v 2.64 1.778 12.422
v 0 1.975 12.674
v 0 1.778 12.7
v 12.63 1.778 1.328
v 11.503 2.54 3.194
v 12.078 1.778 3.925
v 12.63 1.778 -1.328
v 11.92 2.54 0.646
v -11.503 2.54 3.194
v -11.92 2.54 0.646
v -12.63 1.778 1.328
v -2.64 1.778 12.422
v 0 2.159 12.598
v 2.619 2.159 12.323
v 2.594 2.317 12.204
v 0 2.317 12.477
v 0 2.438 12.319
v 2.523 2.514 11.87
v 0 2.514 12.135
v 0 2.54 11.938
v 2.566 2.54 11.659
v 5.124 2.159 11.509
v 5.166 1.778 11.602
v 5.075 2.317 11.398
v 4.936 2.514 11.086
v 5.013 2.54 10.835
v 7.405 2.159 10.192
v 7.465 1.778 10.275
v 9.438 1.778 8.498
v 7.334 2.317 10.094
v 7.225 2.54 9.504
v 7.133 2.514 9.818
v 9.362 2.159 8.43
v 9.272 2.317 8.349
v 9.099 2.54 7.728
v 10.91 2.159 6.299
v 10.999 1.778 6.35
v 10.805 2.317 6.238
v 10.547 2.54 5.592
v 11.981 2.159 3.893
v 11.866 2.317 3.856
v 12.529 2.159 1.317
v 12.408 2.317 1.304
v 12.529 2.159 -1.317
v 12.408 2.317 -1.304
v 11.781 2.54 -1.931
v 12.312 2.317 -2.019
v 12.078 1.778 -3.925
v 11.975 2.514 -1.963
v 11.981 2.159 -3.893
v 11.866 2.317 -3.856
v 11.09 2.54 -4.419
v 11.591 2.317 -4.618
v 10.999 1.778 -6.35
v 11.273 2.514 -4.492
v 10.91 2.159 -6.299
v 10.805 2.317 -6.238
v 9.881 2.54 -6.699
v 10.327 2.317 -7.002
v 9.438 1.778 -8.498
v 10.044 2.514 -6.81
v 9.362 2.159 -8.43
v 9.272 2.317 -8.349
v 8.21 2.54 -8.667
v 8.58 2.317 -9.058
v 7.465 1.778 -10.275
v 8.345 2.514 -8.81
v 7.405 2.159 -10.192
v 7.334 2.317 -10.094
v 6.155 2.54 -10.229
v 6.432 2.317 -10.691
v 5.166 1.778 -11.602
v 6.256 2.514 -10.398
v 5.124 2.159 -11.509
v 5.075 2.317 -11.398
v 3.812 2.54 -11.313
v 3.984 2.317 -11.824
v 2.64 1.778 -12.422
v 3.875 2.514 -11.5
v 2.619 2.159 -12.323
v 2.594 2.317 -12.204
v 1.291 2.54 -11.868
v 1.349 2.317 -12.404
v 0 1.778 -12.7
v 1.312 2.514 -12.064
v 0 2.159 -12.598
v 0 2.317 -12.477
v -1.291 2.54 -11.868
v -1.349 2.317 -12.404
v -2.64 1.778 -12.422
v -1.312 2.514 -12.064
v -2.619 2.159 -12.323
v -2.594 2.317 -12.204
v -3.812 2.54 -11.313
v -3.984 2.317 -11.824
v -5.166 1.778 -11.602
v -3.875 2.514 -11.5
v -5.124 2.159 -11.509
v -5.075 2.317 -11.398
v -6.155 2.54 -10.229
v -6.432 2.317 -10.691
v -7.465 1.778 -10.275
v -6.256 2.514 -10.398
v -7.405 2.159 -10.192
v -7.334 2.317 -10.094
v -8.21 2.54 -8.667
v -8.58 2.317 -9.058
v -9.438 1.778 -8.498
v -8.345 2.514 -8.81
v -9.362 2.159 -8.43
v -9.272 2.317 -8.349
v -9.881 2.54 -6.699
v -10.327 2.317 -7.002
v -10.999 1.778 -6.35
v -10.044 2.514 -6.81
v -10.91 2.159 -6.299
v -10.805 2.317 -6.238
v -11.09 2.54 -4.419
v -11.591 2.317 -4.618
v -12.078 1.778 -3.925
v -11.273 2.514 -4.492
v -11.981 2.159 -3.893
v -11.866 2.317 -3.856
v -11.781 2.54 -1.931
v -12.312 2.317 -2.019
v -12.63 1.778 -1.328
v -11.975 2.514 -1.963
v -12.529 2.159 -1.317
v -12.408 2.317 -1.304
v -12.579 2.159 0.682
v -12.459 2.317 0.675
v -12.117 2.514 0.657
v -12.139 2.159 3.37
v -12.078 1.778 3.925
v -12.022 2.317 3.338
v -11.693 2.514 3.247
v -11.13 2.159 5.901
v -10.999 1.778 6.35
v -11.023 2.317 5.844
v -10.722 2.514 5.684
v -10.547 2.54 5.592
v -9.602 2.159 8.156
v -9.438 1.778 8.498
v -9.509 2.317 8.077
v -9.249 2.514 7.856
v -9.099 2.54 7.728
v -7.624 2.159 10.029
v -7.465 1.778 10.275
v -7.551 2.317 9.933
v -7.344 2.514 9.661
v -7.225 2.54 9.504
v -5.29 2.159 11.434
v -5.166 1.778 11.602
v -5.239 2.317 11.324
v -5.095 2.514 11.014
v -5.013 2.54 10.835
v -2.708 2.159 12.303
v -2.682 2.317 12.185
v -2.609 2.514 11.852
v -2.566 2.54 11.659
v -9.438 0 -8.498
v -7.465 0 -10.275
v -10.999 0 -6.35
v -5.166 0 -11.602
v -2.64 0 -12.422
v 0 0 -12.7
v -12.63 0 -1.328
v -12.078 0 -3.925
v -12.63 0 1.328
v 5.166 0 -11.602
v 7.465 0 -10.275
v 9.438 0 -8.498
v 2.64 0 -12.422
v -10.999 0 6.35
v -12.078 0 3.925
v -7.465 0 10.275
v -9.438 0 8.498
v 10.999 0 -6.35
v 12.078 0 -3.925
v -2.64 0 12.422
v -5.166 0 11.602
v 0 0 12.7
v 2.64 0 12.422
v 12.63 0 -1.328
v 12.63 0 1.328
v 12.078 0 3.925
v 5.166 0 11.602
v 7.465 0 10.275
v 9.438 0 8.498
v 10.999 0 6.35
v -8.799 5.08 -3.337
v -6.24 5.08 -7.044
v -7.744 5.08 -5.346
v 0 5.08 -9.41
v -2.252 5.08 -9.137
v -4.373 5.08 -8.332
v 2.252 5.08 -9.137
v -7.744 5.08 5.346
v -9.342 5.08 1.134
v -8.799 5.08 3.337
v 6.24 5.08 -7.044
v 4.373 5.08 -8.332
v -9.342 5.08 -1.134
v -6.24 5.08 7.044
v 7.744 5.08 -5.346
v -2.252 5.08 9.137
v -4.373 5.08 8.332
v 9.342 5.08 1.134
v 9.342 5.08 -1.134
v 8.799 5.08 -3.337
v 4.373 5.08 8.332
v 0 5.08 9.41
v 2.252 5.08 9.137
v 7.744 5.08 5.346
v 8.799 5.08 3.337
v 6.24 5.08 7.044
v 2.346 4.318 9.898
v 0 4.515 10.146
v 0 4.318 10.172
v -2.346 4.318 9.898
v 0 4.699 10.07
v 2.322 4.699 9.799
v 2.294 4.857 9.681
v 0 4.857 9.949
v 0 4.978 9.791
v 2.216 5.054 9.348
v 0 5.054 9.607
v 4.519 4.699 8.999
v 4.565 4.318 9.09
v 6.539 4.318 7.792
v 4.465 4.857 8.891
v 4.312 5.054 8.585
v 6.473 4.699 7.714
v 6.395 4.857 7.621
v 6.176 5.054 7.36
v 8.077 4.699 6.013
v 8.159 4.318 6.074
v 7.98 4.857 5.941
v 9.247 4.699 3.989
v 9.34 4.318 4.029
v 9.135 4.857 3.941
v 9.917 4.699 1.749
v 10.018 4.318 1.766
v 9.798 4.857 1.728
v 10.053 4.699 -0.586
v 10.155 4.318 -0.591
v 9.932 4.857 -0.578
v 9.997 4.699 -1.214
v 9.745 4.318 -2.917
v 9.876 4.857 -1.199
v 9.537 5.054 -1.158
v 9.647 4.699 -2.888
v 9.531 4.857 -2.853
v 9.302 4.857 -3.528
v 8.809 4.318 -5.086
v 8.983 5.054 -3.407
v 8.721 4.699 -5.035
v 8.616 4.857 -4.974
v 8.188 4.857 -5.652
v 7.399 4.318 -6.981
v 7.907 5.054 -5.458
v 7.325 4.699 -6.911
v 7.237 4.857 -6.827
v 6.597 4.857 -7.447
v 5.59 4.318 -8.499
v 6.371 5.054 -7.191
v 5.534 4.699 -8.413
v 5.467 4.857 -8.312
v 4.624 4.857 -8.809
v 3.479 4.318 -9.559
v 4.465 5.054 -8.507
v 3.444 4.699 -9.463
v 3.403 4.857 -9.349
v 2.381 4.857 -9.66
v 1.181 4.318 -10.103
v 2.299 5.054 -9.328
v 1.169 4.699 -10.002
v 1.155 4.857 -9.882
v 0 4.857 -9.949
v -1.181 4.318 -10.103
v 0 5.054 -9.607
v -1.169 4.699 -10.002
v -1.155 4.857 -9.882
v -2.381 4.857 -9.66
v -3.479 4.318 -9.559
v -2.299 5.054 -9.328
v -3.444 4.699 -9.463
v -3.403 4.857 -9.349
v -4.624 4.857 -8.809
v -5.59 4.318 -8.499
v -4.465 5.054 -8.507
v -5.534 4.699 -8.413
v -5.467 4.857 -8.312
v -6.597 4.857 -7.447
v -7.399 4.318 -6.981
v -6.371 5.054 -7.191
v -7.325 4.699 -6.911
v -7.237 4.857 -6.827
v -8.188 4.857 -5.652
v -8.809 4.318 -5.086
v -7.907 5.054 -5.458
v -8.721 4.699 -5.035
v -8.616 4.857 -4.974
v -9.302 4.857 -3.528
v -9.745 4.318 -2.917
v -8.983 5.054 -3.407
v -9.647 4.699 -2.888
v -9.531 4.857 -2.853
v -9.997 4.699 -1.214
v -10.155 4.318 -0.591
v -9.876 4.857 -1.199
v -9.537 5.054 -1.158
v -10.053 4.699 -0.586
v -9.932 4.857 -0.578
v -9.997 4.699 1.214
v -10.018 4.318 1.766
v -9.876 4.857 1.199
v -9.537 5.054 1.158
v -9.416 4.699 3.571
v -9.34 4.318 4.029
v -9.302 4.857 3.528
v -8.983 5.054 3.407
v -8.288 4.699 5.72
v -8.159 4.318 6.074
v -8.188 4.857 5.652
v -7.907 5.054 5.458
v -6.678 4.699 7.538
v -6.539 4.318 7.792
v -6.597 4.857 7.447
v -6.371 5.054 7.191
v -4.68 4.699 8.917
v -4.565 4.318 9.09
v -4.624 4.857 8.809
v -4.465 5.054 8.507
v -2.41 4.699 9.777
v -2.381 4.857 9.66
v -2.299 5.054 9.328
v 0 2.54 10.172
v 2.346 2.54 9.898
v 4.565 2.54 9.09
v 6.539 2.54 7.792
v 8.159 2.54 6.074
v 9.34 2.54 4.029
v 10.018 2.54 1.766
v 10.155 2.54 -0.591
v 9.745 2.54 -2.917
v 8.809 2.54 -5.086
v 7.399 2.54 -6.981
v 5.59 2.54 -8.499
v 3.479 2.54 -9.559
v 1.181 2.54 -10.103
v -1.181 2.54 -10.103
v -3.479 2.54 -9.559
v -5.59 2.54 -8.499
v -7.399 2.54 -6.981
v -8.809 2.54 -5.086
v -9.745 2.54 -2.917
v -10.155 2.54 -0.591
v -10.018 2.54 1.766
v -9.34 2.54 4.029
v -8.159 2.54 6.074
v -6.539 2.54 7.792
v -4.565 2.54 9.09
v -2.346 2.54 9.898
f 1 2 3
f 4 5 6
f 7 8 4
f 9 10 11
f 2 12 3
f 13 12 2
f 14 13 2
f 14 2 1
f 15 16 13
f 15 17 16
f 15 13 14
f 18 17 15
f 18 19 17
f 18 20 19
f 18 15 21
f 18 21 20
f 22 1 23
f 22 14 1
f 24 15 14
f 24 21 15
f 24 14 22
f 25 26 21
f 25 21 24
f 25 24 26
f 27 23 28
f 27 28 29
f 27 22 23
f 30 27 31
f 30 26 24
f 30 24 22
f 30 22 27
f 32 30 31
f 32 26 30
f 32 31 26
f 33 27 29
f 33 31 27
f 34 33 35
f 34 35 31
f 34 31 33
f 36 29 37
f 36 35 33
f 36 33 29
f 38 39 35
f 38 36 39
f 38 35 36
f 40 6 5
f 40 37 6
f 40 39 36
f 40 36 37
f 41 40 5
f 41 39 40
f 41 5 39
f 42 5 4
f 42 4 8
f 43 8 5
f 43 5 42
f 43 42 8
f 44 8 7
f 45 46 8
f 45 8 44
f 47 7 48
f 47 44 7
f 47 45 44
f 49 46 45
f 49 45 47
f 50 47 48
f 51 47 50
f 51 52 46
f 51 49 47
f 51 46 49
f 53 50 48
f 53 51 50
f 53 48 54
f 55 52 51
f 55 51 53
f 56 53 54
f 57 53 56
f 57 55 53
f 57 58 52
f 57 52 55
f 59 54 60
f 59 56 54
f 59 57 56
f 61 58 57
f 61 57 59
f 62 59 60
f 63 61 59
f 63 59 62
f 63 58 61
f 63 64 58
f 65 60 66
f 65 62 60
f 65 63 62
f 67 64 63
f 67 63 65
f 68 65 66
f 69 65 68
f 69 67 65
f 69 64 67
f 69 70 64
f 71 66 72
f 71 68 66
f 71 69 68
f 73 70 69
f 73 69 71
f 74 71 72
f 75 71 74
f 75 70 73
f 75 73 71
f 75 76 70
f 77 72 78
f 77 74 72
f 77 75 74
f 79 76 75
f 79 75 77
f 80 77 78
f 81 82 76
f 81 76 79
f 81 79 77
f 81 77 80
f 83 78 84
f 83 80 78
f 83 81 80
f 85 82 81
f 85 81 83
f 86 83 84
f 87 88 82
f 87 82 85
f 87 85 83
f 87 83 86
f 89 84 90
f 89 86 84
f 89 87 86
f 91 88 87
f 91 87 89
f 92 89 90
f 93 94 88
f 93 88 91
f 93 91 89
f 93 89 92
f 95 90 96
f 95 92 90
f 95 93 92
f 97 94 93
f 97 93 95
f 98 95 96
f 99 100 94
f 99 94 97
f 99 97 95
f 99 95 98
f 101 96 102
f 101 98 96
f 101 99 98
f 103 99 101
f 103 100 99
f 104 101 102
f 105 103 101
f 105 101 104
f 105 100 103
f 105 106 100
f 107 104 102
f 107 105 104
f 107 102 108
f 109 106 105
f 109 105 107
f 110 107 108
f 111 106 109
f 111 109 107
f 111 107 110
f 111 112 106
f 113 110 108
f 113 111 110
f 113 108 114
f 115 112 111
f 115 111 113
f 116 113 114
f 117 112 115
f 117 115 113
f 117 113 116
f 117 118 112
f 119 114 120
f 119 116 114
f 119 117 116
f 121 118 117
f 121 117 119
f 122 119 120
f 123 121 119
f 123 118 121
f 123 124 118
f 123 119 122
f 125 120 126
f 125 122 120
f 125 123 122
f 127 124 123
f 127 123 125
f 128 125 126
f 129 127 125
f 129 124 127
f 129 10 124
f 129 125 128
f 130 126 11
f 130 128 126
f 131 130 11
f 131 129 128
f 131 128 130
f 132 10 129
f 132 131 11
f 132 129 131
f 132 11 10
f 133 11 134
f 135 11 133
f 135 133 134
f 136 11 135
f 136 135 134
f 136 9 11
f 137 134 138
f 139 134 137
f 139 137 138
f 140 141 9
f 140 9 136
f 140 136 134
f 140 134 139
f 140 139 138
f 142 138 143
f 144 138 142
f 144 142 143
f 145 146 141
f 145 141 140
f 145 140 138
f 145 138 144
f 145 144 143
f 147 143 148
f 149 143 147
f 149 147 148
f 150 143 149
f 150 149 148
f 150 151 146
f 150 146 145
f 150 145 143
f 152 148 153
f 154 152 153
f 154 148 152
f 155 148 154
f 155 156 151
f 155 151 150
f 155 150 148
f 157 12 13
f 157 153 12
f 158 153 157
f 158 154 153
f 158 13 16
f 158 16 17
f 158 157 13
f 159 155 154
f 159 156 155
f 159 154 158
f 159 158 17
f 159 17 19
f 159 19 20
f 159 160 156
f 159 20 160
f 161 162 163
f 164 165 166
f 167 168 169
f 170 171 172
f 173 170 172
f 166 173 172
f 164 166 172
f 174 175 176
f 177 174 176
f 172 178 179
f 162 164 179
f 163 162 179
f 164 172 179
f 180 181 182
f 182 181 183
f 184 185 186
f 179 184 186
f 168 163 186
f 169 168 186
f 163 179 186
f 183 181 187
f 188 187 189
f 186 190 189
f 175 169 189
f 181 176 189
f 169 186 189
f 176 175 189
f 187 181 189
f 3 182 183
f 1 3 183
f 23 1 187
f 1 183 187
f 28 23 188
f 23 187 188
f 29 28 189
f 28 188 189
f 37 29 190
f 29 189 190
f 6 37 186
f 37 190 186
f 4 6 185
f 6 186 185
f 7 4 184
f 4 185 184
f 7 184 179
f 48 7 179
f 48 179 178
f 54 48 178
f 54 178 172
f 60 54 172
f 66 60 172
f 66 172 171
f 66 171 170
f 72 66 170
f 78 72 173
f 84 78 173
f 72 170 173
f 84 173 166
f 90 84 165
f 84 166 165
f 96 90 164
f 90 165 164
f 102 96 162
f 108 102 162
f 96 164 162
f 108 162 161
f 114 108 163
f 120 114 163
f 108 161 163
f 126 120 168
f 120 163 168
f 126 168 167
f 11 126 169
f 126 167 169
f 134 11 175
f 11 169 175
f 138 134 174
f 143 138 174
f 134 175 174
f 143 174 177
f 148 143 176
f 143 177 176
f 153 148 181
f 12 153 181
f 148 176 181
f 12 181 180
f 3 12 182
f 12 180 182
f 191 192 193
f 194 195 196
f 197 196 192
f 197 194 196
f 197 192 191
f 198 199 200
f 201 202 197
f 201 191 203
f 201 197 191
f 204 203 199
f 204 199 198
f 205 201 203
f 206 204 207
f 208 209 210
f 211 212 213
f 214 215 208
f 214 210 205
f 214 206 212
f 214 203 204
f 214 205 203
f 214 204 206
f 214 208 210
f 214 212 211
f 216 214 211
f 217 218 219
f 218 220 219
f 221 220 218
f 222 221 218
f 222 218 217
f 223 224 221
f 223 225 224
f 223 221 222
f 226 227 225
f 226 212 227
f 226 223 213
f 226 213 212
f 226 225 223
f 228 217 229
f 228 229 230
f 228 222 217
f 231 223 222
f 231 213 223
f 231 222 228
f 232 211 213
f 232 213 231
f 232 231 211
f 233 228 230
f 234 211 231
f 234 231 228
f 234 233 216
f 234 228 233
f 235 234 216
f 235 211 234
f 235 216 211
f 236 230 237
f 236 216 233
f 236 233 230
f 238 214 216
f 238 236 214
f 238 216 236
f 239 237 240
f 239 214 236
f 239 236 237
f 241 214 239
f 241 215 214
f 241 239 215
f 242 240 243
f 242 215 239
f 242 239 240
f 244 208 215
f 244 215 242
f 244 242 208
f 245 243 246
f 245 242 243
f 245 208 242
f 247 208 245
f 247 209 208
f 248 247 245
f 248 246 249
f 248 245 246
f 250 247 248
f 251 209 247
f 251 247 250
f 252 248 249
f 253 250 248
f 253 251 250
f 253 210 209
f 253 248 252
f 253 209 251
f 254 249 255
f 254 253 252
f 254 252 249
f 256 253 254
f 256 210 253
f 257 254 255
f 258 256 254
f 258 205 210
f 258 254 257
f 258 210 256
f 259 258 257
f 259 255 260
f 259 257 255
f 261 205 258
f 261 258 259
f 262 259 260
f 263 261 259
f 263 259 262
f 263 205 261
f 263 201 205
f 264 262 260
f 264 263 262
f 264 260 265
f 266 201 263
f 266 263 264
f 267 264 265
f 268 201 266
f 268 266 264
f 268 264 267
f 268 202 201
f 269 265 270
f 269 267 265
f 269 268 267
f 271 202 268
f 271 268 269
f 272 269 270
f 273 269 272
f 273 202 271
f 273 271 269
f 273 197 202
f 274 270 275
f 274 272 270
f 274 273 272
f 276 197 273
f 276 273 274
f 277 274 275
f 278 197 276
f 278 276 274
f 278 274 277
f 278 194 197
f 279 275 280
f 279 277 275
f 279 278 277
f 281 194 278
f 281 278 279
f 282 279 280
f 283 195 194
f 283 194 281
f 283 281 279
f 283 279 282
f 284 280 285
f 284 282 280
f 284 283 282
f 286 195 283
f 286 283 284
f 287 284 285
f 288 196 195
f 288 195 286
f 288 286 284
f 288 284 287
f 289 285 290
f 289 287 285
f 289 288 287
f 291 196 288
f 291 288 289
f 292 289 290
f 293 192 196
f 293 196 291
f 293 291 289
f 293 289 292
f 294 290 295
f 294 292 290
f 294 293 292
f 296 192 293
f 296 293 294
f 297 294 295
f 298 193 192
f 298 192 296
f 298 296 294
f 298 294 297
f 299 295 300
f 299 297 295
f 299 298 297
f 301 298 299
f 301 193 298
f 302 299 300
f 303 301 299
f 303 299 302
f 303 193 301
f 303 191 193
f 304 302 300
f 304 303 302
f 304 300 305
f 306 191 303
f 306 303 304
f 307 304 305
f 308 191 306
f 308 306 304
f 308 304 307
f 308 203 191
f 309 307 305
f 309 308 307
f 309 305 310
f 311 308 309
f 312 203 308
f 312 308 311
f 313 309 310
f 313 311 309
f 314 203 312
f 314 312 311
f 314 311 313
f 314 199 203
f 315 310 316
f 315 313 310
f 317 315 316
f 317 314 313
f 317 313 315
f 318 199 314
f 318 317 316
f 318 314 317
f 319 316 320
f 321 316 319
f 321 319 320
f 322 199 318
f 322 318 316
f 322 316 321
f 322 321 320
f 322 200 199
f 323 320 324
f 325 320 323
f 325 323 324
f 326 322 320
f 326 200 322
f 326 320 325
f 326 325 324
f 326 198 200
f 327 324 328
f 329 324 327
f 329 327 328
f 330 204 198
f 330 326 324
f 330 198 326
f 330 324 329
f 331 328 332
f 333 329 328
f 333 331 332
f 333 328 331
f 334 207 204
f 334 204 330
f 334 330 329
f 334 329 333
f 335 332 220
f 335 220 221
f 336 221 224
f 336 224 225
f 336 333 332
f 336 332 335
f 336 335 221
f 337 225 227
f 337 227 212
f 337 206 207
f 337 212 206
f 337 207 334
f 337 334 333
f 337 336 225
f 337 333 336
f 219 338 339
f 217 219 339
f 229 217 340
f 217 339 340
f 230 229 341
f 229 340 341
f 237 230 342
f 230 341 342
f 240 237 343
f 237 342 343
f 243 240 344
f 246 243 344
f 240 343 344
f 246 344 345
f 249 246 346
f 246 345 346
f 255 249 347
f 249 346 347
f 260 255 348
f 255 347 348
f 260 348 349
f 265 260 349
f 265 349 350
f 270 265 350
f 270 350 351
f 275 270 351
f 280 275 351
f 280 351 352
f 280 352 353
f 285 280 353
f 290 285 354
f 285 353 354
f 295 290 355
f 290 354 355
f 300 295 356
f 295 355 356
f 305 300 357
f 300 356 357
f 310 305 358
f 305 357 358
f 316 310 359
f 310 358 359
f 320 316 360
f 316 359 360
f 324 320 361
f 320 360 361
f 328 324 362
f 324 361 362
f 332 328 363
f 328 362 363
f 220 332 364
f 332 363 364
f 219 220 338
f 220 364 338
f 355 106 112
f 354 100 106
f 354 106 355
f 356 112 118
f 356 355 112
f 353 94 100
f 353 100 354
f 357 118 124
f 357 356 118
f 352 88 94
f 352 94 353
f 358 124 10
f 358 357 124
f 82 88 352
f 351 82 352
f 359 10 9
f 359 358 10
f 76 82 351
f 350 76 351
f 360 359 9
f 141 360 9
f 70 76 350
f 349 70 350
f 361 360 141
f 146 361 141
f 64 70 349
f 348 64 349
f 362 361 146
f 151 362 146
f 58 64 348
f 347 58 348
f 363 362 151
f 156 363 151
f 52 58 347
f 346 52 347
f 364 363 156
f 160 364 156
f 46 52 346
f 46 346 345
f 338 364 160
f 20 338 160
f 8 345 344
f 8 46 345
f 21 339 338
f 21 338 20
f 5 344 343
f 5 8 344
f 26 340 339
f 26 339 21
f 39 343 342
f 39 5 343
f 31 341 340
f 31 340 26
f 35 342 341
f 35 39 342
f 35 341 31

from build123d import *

# Parameters (mm, degrees)
SKETCH1_R           = 12.7
BOSS_EXTRUDE1_DEPTH = 2.54
SKETCH2_R           = 10.172184257
BOSS_EXTRUDE2_DEPTH = 2.54
FILLET1_R           = 0.762
FILLET2_R           = 0.762


with BuildPart() as part:
    # Sketch1 → Boss-Extrude1 (new body)
    with BuildSketch(Plane(origin=(0, 0, 0), x_dir=(1, 0, 0), z_dir=(0, 1, 0))):
        with Locations(Location((0, 0, 0), (0, 0, 270))):
            Circle(SKETCH1_R)
    extrude(amount=BOSS_EXTRUDE1_DEPTH)

    # Sketch2 → Boss-Extrude2 (add)
    with BuildSketch(Plane(origin=(0, 2.54, 0), x_dir=(1, 0, 0), z_dir=(0, 1, 0))):
        with Locations(Location((0, 0, 0), (0, 0, 270))):
            Circle(SKETCH2_R)
    extrude(amount=BOSS_EXTRUDE2_DEPTH)

    # Fillet1
    fillet1_edges = [part.edges().sort_by_distance(p)[0] for p in [
        (0, 2.54, -12.7),
    ]]
    fillet(fillet1_edges, radius=FILLET1_R)

    # Fillet2
    fillet2_edges = [part.edges().sort_by_distance(p)[0] for p in [
        (0, 5.08, -10.172184257),
    ]]
    fillet(fillet2_edges, radius=FILLET2_R)


solid = part.part
